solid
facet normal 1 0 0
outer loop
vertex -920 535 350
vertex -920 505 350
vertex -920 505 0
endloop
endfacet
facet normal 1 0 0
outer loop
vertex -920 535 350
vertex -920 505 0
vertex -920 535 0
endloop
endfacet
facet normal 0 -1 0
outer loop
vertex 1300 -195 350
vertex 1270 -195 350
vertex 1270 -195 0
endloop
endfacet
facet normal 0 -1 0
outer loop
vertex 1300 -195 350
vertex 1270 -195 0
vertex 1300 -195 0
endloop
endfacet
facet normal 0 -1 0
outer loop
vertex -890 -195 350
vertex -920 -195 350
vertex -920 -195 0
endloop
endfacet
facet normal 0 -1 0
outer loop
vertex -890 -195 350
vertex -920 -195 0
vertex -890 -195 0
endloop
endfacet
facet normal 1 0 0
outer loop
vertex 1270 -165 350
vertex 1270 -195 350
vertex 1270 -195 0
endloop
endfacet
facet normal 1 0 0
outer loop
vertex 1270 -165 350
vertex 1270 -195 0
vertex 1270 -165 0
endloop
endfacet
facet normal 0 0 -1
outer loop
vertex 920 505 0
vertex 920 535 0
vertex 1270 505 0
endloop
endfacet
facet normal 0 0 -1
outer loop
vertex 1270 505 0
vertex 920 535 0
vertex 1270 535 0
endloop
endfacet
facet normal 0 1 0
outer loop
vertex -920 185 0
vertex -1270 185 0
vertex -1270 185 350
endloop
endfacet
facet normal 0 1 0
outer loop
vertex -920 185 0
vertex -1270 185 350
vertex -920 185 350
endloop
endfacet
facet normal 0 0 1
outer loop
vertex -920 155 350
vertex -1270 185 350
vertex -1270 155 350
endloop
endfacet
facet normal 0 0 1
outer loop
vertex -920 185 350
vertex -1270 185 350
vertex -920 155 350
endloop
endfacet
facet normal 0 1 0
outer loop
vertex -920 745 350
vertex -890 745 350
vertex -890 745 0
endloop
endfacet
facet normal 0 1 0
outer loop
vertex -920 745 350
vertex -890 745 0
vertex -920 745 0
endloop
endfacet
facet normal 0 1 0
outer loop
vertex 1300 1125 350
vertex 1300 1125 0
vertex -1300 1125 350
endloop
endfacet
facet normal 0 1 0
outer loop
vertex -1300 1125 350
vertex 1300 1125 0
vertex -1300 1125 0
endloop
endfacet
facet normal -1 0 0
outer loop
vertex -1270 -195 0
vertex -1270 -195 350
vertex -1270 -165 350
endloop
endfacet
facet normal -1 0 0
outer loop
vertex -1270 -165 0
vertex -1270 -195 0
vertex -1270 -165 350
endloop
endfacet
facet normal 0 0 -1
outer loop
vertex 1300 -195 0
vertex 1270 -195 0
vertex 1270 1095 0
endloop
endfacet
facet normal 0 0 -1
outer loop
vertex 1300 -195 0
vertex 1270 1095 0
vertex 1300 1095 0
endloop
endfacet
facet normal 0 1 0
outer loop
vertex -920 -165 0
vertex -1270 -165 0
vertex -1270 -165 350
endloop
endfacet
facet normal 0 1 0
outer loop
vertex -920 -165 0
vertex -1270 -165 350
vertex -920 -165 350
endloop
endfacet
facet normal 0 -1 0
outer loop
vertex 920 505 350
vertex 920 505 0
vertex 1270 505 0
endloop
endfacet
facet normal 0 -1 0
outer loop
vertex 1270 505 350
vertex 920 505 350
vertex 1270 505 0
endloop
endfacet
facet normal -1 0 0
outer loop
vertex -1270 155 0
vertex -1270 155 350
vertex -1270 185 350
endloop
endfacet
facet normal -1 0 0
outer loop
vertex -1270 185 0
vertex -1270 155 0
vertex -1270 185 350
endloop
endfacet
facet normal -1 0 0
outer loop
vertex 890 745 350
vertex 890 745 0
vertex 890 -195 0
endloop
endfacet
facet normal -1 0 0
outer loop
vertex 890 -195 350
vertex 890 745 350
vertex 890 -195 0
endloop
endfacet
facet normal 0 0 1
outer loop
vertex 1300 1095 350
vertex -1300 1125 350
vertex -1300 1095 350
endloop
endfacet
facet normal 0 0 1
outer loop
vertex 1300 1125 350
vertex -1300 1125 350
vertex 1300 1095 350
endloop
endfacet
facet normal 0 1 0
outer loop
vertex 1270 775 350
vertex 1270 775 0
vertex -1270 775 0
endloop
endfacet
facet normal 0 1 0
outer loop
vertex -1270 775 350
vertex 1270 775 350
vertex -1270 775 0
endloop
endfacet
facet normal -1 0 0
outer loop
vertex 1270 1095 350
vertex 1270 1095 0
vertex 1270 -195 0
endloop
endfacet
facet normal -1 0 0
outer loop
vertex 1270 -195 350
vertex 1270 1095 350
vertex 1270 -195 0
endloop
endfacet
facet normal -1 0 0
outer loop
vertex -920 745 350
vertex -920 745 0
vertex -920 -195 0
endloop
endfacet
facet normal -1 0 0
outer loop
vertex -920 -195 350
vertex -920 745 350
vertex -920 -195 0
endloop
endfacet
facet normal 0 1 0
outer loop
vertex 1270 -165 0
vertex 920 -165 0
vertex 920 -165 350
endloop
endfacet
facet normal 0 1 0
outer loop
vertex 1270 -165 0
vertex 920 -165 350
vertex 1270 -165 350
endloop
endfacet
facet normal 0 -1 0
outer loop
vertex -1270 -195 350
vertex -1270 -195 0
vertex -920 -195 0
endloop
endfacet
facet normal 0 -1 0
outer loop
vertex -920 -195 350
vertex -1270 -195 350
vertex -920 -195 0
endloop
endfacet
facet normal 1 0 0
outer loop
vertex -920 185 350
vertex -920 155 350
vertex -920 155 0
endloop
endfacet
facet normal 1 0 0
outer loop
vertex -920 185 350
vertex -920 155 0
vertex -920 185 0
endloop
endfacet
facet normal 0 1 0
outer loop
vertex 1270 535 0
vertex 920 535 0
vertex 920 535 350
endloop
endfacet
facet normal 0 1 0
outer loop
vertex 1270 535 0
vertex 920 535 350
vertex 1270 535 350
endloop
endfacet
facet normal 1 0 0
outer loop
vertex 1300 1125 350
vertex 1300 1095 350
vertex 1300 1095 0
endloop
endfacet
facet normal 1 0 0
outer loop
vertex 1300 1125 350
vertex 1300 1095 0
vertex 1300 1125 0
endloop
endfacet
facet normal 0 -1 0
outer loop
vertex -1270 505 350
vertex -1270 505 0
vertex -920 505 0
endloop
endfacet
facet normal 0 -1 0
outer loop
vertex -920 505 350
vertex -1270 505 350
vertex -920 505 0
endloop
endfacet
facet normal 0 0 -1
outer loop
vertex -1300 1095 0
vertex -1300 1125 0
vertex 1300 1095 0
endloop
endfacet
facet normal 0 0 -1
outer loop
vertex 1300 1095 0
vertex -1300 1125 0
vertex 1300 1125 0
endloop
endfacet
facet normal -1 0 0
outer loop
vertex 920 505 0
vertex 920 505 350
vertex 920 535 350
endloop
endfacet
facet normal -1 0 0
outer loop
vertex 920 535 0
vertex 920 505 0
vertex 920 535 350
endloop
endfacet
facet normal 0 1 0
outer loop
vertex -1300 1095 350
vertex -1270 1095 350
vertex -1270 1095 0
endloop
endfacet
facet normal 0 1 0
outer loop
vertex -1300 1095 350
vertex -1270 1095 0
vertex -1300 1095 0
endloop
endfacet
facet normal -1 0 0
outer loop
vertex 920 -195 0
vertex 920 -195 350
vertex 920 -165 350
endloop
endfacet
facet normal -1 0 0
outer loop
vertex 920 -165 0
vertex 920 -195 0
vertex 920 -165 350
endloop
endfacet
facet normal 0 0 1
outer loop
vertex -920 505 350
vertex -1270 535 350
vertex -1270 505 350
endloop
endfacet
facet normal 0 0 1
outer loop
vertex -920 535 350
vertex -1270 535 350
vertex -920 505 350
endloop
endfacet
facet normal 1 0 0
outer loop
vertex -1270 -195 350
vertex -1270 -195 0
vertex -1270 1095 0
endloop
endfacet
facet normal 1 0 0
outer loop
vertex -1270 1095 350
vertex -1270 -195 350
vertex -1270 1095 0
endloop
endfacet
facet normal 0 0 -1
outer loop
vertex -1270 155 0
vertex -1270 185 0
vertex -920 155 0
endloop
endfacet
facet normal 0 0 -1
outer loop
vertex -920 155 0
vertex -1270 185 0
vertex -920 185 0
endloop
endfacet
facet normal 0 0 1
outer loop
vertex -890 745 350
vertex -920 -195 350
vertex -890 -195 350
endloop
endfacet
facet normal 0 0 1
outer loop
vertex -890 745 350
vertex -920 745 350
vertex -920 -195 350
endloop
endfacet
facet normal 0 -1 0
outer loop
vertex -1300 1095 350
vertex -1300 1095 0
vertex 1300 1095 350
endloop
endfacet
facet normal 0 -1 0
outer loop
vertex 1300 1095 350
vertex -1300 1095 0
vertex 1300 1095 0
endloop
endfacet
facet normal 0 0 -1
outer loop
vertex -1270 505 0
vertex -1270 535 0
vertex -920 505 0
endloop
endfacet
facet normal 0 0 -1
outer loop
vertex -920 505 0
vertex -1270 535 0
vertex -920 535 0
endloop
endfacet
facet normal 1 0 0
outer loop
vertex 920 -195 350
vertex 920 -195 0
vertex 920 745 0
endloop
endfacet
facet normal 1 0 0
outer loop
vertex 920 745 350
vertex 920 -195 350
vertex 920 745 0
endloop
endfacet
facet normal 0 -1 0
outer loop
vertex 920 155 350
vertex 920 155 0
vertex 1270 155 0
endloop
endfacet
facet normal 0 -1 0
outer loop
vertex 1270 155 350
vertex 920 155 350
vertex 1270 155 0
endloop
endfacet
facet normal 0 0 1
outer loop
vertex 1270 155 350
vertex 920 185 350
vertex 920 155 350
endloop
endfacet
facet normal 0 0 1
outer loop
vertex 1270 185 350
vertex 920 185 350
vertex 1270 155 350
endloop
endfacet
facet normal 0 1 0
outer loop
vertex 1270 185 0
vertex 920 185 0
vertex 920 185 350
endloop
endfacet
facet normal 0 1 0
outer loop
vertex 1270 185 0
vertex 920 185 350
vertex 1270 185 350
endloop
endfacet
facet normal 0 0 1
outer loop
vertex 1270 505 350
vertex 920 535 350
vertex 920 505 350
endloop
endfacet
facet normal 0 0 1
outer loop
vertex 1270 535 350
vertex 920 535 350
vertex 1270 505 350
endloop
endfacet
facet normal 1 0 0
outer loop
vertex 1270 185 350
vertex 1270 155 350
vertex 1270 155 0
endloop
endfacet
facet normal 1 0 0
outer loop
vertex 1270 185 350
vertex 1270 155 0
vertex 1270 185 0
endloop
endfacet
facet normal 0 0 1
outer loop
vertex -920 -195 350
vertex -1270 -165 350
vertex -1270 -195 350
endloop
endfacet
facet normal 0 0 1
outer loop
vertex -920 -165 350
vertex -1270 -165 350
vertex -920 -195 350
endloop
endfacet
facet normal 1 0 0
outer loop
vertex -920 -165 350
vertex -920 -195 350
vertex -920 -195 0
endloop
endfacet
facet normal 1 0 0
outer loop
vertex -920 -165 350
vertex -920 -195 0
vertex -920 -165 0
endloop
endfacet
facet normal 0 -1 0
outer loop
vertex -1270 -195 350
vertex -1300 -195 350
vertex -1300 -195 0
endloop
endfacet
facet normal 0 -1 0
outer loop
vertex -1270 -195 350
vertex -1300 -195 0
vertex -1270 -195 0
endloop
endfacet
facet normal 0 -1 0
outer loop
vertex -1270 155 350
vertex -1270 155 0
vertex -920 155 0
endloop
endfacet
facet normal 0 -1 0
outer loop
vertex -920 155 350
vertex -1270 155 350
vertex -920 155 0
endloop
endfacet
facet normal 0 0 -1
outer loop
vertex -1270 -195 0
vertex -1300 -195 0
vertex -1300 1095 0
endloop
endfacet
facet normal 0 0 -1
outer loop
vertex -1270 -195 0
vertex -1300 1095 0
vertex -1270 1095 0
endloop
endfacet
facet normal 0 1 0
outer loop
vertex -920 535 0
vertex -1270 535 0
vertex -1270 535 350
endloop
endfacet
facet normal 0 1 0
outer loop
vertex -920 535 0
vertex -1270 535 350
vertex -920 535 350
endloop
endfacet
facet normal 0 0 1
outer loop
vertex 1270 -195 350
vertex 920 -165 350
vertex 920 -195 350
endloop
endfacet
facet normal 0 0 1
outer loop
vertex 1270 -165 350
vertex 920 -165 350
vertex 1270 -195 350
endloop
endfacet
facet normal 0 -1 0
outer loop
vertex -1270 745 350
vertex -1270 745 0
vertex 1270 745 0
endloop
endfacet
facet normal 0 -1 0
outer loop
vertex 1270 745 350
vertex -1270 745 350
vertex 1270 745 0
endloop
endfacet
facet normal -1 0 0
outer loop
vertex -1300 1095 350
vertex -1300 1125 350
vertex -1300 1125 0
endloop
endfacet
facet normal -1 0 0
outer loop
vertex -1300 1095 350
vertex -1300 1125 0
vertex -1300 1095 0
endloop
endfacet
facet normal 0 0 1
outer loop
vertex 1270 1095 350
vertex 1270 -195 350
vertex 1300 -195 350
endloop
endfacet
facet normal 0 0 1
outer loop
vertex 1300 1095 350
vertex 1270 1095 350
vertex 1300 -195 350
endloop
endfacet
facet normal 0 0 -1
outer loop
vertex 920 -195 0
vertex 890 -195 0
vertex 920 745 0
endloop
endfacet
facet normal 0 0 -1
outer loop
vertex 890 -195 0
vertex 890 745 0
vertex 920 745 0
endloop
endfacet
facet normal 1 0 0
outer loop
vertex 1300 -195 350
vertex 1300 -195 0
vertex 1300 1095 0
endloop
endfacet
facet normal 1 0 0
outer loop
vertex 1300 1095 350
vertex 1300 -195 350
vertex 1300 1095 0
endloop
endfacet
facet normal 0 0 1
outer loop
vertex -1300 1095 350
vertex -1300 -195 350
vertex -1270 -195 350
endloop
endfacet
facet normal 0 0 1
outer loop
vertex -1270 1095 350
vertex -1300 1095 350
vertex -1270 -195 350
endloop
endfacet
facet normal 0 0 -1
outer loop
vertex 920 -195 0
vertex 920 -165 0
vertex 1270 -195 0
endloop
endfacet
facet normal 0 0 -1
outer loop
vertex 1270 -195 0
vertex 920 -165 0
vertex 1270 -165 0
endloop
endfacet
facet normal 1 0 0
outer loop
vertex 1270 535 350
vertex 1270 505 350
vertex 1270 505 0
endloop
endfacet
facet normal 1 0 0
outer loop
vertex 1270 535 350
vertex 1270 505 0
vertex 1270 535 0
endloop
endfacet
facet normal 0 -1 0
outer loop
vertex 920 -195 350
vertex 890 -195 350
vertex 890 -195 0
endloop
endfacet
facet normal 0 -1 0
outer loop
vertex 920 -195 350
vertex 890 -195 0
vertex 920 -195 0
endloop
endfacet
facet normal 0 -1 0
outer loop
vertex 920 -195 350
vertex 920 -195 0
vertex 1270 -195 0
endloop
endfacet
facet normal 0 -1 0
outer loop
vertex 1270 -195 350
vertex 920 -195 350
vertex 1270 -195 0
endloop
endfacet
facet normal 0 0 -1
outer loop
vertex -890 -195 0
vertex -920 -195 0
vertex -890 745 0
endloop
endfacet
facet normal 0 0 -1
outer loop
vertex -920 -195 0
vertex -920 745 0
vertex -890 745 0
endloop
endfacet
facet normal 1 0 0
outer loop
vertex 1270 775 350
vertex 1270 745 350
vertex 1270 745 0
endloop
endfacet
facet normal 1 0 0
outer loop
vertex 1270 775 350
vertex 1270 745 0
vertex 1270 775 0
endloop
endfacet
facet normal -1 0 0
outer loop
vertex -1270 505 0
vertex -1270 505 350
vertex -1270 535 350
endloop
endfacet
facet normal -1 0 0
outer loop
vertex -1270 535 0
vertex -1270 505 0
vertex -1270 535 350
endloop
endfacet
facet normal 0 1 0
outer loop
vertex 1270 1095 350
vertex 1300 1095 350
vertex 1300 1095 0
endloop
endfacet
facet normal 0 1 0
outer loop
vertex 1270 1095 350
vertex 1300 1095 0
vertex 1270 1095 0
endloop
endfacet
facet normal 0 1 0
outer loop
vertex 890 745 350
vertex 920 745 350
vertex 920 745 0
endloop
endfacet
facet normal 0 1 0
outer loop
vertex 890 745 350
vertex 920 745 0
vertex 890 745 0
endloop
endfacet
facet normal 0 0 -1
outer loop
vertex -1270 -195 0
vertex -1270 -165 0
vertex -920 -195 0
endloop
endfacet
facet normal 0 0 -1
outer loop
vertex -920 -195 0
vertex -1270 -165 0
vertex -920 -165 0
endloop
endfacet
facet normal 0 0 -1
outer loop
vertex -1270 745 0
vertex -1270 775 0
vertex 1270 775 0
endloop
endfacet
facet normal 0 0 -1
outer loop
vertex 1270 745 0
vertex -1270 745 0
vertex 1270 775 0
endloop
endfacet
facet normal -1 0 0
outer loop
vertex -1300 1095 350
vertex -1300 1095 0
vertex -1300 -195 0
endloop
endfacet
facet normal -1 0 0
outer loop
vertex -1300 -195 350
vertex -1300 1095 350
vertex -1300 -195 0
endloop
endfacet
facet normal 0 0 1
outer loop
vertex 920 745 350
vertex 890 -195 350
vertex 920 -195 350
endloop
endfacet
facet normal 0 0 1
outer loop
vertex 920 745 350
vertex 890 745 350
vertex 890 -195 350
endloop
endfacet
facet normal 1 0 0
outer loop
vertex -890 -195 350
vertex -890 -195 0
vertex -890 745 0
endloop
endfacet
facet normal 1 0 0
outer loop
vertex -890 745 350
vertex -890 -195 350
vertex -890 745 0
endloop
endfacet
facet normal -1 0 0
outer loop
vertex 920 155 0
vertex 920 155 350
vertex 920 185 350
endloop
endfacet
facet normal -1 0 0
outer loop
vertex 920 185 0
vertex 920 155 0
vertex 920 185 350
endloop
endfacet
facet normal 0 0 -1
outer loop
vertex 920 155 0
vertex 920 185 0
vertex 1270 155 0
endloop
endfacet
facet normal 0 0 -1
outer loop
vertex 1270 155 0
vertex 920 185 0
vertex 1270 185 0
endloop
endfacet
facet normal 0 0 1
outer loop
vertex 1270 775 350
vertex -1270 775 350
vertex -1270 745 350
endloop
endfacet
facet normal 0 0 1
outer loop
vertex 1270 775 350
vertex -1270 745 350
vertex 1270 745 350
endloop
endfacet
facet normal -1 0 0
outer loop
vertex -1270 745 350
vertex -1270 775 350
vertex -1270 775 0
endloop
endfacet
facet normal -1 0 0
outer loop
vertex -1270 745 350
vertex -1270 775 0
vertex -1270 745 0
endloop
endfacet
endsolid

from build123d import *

# Parameters (mm, degrees)
F0_W     = 350
F0_H     = 30
F1_DEPTH = 350
F2_DEPTH = 350


with BuildPart() as f1:
    # F0 (on Top) → F1 (new body)
    with BuildSketch(Plane.XY):
        with Locations((-1095, -180)):
            Rectangle(F0_W, F0_H)
    extrude(amount=F1_DEPTH)


with BuildPart() as f1b:
    # F0 (on Top) → F1, piece 2 (new body)
    with BuildSketch(Plane.XY):
        with Locations((-1095, 170)):
            Rectangle(F0_W, F0_H)
    extrude(amount=F1_DEPTH)


with BuildPart() as f1c:
    # F0 (on Top) → F1, piece 3 (new body)
    with BuildSketch(Plane.XY):
        with Locations((-1095, 520)):
            Rectangle(F0_W, F0_H)
    extrude(amount=F1_DEPTH)


with BuildPart() as f1d:
    # F0 (on Top) → F1, piece 4 (new body)
    with BuildSketch(Plane.XY):
        Polygon((1270, 745), (1270, 775), (-1270, 775), (-1270, 745), (-920, 745), (-890, 745), (890, 745), (920, 745), align=None)
    extrude(amount=F1_DEPTH)


with BuildPart() as f1e:
    # F0 (on Top) → F1, piece 5 (new body)
    with BuildSketch(Plane.XY):
        Polygon((1300, 1095), (1300, 1125), (-1300, 1125), (-1300, 1095), (-1270, 1095), (1270, 1095), align=None)
    extrude(amount=F1_DEPTH)


with BuildPart() as f1f:
    # F0 (on Top) → F1, piece 6 (new body)
    with BuildSketch(Plane.XY):
        with Locations((1095, 520)):
            Rectangle(F0_W, F0_H)
    extrude(amount=F1_DEPTH)


with BuildPart() as f1g:
    # F0 (on Top) → F1, piece 7 (new body)
    with BuildSketch(Plane.XY):
        with Locations((1095, 170)):
            Rectangle(F0_W, F0_H)
    extrude(amount=F1_DEPTH)


with BuildPart() as f1h:
    # F0 (on Top) → F1, piece 8 (new body)
    with BuildSketch(Plane.XY):
        with Locations((1095, -180)):
            Rectangle(F0_W, F0_H)
    extrude(amount=F1_DEPTH)


with BuildPart() as f2:
    # F0 (on Top) → F2 (new body)
    with BuildSketch(Plane.XY):
        Polygon((-1270, 1095), (-1300, 1095), (-1300, -195), (-1270, -195), (-1270, -165), (-1270, 155), (-1270, 185), (-1270, 505), (-1270, 535), (-1270, 745), (-1270, 775), align=None)
    extrude(amount=F2_DEPTH)


with BuildPart() as f2b:
    # F0 (on Top) → F2, piece 2 (new body)
    with BuildSketch(Plane.XY):
        Polygon((-920, -165), (-920, -195), (-890, -195), (-890, 745), (-920, 745), (-920, 535), (-920, 505), (-920, 185), (-920, 155), align=None)
    extrude(amount=F2_DEPTH)


with BuildPart() as f2c:
    # F0 (on Top) → F2, piece 3 (new body)
    with BuildSketch(Plane.XY):
        Polygon((890, -195), (920, -195), (920, -165), (920, 155), (920, 185), (920, 505), (920, 535), (920, 745), (890, 745), align=None)
    extrude(amount=F2_DEPTH)


with BuildPart() as f2d:
    # F0 (on Top) → F2, piece 4 (new body)
    with BuildSketch(Plane.XY):
        Polygon((1300, -195), (1300, 1095), (1270, 1095), (1270, 775), (1270, 745), (1270, 535), (1270, 505), (1270, 185), (1270, 155), (1270, -165), (1270, -195), align=None)
    extrude(amount=F2_DEPTH)


solid = Compound([f1.part, f1b.part, f1c.part, f1d.part, f1e.part, f1f.part, f1g.part, f1h.part, f2.part, f2b.part, f2c.part, f2d.part])
